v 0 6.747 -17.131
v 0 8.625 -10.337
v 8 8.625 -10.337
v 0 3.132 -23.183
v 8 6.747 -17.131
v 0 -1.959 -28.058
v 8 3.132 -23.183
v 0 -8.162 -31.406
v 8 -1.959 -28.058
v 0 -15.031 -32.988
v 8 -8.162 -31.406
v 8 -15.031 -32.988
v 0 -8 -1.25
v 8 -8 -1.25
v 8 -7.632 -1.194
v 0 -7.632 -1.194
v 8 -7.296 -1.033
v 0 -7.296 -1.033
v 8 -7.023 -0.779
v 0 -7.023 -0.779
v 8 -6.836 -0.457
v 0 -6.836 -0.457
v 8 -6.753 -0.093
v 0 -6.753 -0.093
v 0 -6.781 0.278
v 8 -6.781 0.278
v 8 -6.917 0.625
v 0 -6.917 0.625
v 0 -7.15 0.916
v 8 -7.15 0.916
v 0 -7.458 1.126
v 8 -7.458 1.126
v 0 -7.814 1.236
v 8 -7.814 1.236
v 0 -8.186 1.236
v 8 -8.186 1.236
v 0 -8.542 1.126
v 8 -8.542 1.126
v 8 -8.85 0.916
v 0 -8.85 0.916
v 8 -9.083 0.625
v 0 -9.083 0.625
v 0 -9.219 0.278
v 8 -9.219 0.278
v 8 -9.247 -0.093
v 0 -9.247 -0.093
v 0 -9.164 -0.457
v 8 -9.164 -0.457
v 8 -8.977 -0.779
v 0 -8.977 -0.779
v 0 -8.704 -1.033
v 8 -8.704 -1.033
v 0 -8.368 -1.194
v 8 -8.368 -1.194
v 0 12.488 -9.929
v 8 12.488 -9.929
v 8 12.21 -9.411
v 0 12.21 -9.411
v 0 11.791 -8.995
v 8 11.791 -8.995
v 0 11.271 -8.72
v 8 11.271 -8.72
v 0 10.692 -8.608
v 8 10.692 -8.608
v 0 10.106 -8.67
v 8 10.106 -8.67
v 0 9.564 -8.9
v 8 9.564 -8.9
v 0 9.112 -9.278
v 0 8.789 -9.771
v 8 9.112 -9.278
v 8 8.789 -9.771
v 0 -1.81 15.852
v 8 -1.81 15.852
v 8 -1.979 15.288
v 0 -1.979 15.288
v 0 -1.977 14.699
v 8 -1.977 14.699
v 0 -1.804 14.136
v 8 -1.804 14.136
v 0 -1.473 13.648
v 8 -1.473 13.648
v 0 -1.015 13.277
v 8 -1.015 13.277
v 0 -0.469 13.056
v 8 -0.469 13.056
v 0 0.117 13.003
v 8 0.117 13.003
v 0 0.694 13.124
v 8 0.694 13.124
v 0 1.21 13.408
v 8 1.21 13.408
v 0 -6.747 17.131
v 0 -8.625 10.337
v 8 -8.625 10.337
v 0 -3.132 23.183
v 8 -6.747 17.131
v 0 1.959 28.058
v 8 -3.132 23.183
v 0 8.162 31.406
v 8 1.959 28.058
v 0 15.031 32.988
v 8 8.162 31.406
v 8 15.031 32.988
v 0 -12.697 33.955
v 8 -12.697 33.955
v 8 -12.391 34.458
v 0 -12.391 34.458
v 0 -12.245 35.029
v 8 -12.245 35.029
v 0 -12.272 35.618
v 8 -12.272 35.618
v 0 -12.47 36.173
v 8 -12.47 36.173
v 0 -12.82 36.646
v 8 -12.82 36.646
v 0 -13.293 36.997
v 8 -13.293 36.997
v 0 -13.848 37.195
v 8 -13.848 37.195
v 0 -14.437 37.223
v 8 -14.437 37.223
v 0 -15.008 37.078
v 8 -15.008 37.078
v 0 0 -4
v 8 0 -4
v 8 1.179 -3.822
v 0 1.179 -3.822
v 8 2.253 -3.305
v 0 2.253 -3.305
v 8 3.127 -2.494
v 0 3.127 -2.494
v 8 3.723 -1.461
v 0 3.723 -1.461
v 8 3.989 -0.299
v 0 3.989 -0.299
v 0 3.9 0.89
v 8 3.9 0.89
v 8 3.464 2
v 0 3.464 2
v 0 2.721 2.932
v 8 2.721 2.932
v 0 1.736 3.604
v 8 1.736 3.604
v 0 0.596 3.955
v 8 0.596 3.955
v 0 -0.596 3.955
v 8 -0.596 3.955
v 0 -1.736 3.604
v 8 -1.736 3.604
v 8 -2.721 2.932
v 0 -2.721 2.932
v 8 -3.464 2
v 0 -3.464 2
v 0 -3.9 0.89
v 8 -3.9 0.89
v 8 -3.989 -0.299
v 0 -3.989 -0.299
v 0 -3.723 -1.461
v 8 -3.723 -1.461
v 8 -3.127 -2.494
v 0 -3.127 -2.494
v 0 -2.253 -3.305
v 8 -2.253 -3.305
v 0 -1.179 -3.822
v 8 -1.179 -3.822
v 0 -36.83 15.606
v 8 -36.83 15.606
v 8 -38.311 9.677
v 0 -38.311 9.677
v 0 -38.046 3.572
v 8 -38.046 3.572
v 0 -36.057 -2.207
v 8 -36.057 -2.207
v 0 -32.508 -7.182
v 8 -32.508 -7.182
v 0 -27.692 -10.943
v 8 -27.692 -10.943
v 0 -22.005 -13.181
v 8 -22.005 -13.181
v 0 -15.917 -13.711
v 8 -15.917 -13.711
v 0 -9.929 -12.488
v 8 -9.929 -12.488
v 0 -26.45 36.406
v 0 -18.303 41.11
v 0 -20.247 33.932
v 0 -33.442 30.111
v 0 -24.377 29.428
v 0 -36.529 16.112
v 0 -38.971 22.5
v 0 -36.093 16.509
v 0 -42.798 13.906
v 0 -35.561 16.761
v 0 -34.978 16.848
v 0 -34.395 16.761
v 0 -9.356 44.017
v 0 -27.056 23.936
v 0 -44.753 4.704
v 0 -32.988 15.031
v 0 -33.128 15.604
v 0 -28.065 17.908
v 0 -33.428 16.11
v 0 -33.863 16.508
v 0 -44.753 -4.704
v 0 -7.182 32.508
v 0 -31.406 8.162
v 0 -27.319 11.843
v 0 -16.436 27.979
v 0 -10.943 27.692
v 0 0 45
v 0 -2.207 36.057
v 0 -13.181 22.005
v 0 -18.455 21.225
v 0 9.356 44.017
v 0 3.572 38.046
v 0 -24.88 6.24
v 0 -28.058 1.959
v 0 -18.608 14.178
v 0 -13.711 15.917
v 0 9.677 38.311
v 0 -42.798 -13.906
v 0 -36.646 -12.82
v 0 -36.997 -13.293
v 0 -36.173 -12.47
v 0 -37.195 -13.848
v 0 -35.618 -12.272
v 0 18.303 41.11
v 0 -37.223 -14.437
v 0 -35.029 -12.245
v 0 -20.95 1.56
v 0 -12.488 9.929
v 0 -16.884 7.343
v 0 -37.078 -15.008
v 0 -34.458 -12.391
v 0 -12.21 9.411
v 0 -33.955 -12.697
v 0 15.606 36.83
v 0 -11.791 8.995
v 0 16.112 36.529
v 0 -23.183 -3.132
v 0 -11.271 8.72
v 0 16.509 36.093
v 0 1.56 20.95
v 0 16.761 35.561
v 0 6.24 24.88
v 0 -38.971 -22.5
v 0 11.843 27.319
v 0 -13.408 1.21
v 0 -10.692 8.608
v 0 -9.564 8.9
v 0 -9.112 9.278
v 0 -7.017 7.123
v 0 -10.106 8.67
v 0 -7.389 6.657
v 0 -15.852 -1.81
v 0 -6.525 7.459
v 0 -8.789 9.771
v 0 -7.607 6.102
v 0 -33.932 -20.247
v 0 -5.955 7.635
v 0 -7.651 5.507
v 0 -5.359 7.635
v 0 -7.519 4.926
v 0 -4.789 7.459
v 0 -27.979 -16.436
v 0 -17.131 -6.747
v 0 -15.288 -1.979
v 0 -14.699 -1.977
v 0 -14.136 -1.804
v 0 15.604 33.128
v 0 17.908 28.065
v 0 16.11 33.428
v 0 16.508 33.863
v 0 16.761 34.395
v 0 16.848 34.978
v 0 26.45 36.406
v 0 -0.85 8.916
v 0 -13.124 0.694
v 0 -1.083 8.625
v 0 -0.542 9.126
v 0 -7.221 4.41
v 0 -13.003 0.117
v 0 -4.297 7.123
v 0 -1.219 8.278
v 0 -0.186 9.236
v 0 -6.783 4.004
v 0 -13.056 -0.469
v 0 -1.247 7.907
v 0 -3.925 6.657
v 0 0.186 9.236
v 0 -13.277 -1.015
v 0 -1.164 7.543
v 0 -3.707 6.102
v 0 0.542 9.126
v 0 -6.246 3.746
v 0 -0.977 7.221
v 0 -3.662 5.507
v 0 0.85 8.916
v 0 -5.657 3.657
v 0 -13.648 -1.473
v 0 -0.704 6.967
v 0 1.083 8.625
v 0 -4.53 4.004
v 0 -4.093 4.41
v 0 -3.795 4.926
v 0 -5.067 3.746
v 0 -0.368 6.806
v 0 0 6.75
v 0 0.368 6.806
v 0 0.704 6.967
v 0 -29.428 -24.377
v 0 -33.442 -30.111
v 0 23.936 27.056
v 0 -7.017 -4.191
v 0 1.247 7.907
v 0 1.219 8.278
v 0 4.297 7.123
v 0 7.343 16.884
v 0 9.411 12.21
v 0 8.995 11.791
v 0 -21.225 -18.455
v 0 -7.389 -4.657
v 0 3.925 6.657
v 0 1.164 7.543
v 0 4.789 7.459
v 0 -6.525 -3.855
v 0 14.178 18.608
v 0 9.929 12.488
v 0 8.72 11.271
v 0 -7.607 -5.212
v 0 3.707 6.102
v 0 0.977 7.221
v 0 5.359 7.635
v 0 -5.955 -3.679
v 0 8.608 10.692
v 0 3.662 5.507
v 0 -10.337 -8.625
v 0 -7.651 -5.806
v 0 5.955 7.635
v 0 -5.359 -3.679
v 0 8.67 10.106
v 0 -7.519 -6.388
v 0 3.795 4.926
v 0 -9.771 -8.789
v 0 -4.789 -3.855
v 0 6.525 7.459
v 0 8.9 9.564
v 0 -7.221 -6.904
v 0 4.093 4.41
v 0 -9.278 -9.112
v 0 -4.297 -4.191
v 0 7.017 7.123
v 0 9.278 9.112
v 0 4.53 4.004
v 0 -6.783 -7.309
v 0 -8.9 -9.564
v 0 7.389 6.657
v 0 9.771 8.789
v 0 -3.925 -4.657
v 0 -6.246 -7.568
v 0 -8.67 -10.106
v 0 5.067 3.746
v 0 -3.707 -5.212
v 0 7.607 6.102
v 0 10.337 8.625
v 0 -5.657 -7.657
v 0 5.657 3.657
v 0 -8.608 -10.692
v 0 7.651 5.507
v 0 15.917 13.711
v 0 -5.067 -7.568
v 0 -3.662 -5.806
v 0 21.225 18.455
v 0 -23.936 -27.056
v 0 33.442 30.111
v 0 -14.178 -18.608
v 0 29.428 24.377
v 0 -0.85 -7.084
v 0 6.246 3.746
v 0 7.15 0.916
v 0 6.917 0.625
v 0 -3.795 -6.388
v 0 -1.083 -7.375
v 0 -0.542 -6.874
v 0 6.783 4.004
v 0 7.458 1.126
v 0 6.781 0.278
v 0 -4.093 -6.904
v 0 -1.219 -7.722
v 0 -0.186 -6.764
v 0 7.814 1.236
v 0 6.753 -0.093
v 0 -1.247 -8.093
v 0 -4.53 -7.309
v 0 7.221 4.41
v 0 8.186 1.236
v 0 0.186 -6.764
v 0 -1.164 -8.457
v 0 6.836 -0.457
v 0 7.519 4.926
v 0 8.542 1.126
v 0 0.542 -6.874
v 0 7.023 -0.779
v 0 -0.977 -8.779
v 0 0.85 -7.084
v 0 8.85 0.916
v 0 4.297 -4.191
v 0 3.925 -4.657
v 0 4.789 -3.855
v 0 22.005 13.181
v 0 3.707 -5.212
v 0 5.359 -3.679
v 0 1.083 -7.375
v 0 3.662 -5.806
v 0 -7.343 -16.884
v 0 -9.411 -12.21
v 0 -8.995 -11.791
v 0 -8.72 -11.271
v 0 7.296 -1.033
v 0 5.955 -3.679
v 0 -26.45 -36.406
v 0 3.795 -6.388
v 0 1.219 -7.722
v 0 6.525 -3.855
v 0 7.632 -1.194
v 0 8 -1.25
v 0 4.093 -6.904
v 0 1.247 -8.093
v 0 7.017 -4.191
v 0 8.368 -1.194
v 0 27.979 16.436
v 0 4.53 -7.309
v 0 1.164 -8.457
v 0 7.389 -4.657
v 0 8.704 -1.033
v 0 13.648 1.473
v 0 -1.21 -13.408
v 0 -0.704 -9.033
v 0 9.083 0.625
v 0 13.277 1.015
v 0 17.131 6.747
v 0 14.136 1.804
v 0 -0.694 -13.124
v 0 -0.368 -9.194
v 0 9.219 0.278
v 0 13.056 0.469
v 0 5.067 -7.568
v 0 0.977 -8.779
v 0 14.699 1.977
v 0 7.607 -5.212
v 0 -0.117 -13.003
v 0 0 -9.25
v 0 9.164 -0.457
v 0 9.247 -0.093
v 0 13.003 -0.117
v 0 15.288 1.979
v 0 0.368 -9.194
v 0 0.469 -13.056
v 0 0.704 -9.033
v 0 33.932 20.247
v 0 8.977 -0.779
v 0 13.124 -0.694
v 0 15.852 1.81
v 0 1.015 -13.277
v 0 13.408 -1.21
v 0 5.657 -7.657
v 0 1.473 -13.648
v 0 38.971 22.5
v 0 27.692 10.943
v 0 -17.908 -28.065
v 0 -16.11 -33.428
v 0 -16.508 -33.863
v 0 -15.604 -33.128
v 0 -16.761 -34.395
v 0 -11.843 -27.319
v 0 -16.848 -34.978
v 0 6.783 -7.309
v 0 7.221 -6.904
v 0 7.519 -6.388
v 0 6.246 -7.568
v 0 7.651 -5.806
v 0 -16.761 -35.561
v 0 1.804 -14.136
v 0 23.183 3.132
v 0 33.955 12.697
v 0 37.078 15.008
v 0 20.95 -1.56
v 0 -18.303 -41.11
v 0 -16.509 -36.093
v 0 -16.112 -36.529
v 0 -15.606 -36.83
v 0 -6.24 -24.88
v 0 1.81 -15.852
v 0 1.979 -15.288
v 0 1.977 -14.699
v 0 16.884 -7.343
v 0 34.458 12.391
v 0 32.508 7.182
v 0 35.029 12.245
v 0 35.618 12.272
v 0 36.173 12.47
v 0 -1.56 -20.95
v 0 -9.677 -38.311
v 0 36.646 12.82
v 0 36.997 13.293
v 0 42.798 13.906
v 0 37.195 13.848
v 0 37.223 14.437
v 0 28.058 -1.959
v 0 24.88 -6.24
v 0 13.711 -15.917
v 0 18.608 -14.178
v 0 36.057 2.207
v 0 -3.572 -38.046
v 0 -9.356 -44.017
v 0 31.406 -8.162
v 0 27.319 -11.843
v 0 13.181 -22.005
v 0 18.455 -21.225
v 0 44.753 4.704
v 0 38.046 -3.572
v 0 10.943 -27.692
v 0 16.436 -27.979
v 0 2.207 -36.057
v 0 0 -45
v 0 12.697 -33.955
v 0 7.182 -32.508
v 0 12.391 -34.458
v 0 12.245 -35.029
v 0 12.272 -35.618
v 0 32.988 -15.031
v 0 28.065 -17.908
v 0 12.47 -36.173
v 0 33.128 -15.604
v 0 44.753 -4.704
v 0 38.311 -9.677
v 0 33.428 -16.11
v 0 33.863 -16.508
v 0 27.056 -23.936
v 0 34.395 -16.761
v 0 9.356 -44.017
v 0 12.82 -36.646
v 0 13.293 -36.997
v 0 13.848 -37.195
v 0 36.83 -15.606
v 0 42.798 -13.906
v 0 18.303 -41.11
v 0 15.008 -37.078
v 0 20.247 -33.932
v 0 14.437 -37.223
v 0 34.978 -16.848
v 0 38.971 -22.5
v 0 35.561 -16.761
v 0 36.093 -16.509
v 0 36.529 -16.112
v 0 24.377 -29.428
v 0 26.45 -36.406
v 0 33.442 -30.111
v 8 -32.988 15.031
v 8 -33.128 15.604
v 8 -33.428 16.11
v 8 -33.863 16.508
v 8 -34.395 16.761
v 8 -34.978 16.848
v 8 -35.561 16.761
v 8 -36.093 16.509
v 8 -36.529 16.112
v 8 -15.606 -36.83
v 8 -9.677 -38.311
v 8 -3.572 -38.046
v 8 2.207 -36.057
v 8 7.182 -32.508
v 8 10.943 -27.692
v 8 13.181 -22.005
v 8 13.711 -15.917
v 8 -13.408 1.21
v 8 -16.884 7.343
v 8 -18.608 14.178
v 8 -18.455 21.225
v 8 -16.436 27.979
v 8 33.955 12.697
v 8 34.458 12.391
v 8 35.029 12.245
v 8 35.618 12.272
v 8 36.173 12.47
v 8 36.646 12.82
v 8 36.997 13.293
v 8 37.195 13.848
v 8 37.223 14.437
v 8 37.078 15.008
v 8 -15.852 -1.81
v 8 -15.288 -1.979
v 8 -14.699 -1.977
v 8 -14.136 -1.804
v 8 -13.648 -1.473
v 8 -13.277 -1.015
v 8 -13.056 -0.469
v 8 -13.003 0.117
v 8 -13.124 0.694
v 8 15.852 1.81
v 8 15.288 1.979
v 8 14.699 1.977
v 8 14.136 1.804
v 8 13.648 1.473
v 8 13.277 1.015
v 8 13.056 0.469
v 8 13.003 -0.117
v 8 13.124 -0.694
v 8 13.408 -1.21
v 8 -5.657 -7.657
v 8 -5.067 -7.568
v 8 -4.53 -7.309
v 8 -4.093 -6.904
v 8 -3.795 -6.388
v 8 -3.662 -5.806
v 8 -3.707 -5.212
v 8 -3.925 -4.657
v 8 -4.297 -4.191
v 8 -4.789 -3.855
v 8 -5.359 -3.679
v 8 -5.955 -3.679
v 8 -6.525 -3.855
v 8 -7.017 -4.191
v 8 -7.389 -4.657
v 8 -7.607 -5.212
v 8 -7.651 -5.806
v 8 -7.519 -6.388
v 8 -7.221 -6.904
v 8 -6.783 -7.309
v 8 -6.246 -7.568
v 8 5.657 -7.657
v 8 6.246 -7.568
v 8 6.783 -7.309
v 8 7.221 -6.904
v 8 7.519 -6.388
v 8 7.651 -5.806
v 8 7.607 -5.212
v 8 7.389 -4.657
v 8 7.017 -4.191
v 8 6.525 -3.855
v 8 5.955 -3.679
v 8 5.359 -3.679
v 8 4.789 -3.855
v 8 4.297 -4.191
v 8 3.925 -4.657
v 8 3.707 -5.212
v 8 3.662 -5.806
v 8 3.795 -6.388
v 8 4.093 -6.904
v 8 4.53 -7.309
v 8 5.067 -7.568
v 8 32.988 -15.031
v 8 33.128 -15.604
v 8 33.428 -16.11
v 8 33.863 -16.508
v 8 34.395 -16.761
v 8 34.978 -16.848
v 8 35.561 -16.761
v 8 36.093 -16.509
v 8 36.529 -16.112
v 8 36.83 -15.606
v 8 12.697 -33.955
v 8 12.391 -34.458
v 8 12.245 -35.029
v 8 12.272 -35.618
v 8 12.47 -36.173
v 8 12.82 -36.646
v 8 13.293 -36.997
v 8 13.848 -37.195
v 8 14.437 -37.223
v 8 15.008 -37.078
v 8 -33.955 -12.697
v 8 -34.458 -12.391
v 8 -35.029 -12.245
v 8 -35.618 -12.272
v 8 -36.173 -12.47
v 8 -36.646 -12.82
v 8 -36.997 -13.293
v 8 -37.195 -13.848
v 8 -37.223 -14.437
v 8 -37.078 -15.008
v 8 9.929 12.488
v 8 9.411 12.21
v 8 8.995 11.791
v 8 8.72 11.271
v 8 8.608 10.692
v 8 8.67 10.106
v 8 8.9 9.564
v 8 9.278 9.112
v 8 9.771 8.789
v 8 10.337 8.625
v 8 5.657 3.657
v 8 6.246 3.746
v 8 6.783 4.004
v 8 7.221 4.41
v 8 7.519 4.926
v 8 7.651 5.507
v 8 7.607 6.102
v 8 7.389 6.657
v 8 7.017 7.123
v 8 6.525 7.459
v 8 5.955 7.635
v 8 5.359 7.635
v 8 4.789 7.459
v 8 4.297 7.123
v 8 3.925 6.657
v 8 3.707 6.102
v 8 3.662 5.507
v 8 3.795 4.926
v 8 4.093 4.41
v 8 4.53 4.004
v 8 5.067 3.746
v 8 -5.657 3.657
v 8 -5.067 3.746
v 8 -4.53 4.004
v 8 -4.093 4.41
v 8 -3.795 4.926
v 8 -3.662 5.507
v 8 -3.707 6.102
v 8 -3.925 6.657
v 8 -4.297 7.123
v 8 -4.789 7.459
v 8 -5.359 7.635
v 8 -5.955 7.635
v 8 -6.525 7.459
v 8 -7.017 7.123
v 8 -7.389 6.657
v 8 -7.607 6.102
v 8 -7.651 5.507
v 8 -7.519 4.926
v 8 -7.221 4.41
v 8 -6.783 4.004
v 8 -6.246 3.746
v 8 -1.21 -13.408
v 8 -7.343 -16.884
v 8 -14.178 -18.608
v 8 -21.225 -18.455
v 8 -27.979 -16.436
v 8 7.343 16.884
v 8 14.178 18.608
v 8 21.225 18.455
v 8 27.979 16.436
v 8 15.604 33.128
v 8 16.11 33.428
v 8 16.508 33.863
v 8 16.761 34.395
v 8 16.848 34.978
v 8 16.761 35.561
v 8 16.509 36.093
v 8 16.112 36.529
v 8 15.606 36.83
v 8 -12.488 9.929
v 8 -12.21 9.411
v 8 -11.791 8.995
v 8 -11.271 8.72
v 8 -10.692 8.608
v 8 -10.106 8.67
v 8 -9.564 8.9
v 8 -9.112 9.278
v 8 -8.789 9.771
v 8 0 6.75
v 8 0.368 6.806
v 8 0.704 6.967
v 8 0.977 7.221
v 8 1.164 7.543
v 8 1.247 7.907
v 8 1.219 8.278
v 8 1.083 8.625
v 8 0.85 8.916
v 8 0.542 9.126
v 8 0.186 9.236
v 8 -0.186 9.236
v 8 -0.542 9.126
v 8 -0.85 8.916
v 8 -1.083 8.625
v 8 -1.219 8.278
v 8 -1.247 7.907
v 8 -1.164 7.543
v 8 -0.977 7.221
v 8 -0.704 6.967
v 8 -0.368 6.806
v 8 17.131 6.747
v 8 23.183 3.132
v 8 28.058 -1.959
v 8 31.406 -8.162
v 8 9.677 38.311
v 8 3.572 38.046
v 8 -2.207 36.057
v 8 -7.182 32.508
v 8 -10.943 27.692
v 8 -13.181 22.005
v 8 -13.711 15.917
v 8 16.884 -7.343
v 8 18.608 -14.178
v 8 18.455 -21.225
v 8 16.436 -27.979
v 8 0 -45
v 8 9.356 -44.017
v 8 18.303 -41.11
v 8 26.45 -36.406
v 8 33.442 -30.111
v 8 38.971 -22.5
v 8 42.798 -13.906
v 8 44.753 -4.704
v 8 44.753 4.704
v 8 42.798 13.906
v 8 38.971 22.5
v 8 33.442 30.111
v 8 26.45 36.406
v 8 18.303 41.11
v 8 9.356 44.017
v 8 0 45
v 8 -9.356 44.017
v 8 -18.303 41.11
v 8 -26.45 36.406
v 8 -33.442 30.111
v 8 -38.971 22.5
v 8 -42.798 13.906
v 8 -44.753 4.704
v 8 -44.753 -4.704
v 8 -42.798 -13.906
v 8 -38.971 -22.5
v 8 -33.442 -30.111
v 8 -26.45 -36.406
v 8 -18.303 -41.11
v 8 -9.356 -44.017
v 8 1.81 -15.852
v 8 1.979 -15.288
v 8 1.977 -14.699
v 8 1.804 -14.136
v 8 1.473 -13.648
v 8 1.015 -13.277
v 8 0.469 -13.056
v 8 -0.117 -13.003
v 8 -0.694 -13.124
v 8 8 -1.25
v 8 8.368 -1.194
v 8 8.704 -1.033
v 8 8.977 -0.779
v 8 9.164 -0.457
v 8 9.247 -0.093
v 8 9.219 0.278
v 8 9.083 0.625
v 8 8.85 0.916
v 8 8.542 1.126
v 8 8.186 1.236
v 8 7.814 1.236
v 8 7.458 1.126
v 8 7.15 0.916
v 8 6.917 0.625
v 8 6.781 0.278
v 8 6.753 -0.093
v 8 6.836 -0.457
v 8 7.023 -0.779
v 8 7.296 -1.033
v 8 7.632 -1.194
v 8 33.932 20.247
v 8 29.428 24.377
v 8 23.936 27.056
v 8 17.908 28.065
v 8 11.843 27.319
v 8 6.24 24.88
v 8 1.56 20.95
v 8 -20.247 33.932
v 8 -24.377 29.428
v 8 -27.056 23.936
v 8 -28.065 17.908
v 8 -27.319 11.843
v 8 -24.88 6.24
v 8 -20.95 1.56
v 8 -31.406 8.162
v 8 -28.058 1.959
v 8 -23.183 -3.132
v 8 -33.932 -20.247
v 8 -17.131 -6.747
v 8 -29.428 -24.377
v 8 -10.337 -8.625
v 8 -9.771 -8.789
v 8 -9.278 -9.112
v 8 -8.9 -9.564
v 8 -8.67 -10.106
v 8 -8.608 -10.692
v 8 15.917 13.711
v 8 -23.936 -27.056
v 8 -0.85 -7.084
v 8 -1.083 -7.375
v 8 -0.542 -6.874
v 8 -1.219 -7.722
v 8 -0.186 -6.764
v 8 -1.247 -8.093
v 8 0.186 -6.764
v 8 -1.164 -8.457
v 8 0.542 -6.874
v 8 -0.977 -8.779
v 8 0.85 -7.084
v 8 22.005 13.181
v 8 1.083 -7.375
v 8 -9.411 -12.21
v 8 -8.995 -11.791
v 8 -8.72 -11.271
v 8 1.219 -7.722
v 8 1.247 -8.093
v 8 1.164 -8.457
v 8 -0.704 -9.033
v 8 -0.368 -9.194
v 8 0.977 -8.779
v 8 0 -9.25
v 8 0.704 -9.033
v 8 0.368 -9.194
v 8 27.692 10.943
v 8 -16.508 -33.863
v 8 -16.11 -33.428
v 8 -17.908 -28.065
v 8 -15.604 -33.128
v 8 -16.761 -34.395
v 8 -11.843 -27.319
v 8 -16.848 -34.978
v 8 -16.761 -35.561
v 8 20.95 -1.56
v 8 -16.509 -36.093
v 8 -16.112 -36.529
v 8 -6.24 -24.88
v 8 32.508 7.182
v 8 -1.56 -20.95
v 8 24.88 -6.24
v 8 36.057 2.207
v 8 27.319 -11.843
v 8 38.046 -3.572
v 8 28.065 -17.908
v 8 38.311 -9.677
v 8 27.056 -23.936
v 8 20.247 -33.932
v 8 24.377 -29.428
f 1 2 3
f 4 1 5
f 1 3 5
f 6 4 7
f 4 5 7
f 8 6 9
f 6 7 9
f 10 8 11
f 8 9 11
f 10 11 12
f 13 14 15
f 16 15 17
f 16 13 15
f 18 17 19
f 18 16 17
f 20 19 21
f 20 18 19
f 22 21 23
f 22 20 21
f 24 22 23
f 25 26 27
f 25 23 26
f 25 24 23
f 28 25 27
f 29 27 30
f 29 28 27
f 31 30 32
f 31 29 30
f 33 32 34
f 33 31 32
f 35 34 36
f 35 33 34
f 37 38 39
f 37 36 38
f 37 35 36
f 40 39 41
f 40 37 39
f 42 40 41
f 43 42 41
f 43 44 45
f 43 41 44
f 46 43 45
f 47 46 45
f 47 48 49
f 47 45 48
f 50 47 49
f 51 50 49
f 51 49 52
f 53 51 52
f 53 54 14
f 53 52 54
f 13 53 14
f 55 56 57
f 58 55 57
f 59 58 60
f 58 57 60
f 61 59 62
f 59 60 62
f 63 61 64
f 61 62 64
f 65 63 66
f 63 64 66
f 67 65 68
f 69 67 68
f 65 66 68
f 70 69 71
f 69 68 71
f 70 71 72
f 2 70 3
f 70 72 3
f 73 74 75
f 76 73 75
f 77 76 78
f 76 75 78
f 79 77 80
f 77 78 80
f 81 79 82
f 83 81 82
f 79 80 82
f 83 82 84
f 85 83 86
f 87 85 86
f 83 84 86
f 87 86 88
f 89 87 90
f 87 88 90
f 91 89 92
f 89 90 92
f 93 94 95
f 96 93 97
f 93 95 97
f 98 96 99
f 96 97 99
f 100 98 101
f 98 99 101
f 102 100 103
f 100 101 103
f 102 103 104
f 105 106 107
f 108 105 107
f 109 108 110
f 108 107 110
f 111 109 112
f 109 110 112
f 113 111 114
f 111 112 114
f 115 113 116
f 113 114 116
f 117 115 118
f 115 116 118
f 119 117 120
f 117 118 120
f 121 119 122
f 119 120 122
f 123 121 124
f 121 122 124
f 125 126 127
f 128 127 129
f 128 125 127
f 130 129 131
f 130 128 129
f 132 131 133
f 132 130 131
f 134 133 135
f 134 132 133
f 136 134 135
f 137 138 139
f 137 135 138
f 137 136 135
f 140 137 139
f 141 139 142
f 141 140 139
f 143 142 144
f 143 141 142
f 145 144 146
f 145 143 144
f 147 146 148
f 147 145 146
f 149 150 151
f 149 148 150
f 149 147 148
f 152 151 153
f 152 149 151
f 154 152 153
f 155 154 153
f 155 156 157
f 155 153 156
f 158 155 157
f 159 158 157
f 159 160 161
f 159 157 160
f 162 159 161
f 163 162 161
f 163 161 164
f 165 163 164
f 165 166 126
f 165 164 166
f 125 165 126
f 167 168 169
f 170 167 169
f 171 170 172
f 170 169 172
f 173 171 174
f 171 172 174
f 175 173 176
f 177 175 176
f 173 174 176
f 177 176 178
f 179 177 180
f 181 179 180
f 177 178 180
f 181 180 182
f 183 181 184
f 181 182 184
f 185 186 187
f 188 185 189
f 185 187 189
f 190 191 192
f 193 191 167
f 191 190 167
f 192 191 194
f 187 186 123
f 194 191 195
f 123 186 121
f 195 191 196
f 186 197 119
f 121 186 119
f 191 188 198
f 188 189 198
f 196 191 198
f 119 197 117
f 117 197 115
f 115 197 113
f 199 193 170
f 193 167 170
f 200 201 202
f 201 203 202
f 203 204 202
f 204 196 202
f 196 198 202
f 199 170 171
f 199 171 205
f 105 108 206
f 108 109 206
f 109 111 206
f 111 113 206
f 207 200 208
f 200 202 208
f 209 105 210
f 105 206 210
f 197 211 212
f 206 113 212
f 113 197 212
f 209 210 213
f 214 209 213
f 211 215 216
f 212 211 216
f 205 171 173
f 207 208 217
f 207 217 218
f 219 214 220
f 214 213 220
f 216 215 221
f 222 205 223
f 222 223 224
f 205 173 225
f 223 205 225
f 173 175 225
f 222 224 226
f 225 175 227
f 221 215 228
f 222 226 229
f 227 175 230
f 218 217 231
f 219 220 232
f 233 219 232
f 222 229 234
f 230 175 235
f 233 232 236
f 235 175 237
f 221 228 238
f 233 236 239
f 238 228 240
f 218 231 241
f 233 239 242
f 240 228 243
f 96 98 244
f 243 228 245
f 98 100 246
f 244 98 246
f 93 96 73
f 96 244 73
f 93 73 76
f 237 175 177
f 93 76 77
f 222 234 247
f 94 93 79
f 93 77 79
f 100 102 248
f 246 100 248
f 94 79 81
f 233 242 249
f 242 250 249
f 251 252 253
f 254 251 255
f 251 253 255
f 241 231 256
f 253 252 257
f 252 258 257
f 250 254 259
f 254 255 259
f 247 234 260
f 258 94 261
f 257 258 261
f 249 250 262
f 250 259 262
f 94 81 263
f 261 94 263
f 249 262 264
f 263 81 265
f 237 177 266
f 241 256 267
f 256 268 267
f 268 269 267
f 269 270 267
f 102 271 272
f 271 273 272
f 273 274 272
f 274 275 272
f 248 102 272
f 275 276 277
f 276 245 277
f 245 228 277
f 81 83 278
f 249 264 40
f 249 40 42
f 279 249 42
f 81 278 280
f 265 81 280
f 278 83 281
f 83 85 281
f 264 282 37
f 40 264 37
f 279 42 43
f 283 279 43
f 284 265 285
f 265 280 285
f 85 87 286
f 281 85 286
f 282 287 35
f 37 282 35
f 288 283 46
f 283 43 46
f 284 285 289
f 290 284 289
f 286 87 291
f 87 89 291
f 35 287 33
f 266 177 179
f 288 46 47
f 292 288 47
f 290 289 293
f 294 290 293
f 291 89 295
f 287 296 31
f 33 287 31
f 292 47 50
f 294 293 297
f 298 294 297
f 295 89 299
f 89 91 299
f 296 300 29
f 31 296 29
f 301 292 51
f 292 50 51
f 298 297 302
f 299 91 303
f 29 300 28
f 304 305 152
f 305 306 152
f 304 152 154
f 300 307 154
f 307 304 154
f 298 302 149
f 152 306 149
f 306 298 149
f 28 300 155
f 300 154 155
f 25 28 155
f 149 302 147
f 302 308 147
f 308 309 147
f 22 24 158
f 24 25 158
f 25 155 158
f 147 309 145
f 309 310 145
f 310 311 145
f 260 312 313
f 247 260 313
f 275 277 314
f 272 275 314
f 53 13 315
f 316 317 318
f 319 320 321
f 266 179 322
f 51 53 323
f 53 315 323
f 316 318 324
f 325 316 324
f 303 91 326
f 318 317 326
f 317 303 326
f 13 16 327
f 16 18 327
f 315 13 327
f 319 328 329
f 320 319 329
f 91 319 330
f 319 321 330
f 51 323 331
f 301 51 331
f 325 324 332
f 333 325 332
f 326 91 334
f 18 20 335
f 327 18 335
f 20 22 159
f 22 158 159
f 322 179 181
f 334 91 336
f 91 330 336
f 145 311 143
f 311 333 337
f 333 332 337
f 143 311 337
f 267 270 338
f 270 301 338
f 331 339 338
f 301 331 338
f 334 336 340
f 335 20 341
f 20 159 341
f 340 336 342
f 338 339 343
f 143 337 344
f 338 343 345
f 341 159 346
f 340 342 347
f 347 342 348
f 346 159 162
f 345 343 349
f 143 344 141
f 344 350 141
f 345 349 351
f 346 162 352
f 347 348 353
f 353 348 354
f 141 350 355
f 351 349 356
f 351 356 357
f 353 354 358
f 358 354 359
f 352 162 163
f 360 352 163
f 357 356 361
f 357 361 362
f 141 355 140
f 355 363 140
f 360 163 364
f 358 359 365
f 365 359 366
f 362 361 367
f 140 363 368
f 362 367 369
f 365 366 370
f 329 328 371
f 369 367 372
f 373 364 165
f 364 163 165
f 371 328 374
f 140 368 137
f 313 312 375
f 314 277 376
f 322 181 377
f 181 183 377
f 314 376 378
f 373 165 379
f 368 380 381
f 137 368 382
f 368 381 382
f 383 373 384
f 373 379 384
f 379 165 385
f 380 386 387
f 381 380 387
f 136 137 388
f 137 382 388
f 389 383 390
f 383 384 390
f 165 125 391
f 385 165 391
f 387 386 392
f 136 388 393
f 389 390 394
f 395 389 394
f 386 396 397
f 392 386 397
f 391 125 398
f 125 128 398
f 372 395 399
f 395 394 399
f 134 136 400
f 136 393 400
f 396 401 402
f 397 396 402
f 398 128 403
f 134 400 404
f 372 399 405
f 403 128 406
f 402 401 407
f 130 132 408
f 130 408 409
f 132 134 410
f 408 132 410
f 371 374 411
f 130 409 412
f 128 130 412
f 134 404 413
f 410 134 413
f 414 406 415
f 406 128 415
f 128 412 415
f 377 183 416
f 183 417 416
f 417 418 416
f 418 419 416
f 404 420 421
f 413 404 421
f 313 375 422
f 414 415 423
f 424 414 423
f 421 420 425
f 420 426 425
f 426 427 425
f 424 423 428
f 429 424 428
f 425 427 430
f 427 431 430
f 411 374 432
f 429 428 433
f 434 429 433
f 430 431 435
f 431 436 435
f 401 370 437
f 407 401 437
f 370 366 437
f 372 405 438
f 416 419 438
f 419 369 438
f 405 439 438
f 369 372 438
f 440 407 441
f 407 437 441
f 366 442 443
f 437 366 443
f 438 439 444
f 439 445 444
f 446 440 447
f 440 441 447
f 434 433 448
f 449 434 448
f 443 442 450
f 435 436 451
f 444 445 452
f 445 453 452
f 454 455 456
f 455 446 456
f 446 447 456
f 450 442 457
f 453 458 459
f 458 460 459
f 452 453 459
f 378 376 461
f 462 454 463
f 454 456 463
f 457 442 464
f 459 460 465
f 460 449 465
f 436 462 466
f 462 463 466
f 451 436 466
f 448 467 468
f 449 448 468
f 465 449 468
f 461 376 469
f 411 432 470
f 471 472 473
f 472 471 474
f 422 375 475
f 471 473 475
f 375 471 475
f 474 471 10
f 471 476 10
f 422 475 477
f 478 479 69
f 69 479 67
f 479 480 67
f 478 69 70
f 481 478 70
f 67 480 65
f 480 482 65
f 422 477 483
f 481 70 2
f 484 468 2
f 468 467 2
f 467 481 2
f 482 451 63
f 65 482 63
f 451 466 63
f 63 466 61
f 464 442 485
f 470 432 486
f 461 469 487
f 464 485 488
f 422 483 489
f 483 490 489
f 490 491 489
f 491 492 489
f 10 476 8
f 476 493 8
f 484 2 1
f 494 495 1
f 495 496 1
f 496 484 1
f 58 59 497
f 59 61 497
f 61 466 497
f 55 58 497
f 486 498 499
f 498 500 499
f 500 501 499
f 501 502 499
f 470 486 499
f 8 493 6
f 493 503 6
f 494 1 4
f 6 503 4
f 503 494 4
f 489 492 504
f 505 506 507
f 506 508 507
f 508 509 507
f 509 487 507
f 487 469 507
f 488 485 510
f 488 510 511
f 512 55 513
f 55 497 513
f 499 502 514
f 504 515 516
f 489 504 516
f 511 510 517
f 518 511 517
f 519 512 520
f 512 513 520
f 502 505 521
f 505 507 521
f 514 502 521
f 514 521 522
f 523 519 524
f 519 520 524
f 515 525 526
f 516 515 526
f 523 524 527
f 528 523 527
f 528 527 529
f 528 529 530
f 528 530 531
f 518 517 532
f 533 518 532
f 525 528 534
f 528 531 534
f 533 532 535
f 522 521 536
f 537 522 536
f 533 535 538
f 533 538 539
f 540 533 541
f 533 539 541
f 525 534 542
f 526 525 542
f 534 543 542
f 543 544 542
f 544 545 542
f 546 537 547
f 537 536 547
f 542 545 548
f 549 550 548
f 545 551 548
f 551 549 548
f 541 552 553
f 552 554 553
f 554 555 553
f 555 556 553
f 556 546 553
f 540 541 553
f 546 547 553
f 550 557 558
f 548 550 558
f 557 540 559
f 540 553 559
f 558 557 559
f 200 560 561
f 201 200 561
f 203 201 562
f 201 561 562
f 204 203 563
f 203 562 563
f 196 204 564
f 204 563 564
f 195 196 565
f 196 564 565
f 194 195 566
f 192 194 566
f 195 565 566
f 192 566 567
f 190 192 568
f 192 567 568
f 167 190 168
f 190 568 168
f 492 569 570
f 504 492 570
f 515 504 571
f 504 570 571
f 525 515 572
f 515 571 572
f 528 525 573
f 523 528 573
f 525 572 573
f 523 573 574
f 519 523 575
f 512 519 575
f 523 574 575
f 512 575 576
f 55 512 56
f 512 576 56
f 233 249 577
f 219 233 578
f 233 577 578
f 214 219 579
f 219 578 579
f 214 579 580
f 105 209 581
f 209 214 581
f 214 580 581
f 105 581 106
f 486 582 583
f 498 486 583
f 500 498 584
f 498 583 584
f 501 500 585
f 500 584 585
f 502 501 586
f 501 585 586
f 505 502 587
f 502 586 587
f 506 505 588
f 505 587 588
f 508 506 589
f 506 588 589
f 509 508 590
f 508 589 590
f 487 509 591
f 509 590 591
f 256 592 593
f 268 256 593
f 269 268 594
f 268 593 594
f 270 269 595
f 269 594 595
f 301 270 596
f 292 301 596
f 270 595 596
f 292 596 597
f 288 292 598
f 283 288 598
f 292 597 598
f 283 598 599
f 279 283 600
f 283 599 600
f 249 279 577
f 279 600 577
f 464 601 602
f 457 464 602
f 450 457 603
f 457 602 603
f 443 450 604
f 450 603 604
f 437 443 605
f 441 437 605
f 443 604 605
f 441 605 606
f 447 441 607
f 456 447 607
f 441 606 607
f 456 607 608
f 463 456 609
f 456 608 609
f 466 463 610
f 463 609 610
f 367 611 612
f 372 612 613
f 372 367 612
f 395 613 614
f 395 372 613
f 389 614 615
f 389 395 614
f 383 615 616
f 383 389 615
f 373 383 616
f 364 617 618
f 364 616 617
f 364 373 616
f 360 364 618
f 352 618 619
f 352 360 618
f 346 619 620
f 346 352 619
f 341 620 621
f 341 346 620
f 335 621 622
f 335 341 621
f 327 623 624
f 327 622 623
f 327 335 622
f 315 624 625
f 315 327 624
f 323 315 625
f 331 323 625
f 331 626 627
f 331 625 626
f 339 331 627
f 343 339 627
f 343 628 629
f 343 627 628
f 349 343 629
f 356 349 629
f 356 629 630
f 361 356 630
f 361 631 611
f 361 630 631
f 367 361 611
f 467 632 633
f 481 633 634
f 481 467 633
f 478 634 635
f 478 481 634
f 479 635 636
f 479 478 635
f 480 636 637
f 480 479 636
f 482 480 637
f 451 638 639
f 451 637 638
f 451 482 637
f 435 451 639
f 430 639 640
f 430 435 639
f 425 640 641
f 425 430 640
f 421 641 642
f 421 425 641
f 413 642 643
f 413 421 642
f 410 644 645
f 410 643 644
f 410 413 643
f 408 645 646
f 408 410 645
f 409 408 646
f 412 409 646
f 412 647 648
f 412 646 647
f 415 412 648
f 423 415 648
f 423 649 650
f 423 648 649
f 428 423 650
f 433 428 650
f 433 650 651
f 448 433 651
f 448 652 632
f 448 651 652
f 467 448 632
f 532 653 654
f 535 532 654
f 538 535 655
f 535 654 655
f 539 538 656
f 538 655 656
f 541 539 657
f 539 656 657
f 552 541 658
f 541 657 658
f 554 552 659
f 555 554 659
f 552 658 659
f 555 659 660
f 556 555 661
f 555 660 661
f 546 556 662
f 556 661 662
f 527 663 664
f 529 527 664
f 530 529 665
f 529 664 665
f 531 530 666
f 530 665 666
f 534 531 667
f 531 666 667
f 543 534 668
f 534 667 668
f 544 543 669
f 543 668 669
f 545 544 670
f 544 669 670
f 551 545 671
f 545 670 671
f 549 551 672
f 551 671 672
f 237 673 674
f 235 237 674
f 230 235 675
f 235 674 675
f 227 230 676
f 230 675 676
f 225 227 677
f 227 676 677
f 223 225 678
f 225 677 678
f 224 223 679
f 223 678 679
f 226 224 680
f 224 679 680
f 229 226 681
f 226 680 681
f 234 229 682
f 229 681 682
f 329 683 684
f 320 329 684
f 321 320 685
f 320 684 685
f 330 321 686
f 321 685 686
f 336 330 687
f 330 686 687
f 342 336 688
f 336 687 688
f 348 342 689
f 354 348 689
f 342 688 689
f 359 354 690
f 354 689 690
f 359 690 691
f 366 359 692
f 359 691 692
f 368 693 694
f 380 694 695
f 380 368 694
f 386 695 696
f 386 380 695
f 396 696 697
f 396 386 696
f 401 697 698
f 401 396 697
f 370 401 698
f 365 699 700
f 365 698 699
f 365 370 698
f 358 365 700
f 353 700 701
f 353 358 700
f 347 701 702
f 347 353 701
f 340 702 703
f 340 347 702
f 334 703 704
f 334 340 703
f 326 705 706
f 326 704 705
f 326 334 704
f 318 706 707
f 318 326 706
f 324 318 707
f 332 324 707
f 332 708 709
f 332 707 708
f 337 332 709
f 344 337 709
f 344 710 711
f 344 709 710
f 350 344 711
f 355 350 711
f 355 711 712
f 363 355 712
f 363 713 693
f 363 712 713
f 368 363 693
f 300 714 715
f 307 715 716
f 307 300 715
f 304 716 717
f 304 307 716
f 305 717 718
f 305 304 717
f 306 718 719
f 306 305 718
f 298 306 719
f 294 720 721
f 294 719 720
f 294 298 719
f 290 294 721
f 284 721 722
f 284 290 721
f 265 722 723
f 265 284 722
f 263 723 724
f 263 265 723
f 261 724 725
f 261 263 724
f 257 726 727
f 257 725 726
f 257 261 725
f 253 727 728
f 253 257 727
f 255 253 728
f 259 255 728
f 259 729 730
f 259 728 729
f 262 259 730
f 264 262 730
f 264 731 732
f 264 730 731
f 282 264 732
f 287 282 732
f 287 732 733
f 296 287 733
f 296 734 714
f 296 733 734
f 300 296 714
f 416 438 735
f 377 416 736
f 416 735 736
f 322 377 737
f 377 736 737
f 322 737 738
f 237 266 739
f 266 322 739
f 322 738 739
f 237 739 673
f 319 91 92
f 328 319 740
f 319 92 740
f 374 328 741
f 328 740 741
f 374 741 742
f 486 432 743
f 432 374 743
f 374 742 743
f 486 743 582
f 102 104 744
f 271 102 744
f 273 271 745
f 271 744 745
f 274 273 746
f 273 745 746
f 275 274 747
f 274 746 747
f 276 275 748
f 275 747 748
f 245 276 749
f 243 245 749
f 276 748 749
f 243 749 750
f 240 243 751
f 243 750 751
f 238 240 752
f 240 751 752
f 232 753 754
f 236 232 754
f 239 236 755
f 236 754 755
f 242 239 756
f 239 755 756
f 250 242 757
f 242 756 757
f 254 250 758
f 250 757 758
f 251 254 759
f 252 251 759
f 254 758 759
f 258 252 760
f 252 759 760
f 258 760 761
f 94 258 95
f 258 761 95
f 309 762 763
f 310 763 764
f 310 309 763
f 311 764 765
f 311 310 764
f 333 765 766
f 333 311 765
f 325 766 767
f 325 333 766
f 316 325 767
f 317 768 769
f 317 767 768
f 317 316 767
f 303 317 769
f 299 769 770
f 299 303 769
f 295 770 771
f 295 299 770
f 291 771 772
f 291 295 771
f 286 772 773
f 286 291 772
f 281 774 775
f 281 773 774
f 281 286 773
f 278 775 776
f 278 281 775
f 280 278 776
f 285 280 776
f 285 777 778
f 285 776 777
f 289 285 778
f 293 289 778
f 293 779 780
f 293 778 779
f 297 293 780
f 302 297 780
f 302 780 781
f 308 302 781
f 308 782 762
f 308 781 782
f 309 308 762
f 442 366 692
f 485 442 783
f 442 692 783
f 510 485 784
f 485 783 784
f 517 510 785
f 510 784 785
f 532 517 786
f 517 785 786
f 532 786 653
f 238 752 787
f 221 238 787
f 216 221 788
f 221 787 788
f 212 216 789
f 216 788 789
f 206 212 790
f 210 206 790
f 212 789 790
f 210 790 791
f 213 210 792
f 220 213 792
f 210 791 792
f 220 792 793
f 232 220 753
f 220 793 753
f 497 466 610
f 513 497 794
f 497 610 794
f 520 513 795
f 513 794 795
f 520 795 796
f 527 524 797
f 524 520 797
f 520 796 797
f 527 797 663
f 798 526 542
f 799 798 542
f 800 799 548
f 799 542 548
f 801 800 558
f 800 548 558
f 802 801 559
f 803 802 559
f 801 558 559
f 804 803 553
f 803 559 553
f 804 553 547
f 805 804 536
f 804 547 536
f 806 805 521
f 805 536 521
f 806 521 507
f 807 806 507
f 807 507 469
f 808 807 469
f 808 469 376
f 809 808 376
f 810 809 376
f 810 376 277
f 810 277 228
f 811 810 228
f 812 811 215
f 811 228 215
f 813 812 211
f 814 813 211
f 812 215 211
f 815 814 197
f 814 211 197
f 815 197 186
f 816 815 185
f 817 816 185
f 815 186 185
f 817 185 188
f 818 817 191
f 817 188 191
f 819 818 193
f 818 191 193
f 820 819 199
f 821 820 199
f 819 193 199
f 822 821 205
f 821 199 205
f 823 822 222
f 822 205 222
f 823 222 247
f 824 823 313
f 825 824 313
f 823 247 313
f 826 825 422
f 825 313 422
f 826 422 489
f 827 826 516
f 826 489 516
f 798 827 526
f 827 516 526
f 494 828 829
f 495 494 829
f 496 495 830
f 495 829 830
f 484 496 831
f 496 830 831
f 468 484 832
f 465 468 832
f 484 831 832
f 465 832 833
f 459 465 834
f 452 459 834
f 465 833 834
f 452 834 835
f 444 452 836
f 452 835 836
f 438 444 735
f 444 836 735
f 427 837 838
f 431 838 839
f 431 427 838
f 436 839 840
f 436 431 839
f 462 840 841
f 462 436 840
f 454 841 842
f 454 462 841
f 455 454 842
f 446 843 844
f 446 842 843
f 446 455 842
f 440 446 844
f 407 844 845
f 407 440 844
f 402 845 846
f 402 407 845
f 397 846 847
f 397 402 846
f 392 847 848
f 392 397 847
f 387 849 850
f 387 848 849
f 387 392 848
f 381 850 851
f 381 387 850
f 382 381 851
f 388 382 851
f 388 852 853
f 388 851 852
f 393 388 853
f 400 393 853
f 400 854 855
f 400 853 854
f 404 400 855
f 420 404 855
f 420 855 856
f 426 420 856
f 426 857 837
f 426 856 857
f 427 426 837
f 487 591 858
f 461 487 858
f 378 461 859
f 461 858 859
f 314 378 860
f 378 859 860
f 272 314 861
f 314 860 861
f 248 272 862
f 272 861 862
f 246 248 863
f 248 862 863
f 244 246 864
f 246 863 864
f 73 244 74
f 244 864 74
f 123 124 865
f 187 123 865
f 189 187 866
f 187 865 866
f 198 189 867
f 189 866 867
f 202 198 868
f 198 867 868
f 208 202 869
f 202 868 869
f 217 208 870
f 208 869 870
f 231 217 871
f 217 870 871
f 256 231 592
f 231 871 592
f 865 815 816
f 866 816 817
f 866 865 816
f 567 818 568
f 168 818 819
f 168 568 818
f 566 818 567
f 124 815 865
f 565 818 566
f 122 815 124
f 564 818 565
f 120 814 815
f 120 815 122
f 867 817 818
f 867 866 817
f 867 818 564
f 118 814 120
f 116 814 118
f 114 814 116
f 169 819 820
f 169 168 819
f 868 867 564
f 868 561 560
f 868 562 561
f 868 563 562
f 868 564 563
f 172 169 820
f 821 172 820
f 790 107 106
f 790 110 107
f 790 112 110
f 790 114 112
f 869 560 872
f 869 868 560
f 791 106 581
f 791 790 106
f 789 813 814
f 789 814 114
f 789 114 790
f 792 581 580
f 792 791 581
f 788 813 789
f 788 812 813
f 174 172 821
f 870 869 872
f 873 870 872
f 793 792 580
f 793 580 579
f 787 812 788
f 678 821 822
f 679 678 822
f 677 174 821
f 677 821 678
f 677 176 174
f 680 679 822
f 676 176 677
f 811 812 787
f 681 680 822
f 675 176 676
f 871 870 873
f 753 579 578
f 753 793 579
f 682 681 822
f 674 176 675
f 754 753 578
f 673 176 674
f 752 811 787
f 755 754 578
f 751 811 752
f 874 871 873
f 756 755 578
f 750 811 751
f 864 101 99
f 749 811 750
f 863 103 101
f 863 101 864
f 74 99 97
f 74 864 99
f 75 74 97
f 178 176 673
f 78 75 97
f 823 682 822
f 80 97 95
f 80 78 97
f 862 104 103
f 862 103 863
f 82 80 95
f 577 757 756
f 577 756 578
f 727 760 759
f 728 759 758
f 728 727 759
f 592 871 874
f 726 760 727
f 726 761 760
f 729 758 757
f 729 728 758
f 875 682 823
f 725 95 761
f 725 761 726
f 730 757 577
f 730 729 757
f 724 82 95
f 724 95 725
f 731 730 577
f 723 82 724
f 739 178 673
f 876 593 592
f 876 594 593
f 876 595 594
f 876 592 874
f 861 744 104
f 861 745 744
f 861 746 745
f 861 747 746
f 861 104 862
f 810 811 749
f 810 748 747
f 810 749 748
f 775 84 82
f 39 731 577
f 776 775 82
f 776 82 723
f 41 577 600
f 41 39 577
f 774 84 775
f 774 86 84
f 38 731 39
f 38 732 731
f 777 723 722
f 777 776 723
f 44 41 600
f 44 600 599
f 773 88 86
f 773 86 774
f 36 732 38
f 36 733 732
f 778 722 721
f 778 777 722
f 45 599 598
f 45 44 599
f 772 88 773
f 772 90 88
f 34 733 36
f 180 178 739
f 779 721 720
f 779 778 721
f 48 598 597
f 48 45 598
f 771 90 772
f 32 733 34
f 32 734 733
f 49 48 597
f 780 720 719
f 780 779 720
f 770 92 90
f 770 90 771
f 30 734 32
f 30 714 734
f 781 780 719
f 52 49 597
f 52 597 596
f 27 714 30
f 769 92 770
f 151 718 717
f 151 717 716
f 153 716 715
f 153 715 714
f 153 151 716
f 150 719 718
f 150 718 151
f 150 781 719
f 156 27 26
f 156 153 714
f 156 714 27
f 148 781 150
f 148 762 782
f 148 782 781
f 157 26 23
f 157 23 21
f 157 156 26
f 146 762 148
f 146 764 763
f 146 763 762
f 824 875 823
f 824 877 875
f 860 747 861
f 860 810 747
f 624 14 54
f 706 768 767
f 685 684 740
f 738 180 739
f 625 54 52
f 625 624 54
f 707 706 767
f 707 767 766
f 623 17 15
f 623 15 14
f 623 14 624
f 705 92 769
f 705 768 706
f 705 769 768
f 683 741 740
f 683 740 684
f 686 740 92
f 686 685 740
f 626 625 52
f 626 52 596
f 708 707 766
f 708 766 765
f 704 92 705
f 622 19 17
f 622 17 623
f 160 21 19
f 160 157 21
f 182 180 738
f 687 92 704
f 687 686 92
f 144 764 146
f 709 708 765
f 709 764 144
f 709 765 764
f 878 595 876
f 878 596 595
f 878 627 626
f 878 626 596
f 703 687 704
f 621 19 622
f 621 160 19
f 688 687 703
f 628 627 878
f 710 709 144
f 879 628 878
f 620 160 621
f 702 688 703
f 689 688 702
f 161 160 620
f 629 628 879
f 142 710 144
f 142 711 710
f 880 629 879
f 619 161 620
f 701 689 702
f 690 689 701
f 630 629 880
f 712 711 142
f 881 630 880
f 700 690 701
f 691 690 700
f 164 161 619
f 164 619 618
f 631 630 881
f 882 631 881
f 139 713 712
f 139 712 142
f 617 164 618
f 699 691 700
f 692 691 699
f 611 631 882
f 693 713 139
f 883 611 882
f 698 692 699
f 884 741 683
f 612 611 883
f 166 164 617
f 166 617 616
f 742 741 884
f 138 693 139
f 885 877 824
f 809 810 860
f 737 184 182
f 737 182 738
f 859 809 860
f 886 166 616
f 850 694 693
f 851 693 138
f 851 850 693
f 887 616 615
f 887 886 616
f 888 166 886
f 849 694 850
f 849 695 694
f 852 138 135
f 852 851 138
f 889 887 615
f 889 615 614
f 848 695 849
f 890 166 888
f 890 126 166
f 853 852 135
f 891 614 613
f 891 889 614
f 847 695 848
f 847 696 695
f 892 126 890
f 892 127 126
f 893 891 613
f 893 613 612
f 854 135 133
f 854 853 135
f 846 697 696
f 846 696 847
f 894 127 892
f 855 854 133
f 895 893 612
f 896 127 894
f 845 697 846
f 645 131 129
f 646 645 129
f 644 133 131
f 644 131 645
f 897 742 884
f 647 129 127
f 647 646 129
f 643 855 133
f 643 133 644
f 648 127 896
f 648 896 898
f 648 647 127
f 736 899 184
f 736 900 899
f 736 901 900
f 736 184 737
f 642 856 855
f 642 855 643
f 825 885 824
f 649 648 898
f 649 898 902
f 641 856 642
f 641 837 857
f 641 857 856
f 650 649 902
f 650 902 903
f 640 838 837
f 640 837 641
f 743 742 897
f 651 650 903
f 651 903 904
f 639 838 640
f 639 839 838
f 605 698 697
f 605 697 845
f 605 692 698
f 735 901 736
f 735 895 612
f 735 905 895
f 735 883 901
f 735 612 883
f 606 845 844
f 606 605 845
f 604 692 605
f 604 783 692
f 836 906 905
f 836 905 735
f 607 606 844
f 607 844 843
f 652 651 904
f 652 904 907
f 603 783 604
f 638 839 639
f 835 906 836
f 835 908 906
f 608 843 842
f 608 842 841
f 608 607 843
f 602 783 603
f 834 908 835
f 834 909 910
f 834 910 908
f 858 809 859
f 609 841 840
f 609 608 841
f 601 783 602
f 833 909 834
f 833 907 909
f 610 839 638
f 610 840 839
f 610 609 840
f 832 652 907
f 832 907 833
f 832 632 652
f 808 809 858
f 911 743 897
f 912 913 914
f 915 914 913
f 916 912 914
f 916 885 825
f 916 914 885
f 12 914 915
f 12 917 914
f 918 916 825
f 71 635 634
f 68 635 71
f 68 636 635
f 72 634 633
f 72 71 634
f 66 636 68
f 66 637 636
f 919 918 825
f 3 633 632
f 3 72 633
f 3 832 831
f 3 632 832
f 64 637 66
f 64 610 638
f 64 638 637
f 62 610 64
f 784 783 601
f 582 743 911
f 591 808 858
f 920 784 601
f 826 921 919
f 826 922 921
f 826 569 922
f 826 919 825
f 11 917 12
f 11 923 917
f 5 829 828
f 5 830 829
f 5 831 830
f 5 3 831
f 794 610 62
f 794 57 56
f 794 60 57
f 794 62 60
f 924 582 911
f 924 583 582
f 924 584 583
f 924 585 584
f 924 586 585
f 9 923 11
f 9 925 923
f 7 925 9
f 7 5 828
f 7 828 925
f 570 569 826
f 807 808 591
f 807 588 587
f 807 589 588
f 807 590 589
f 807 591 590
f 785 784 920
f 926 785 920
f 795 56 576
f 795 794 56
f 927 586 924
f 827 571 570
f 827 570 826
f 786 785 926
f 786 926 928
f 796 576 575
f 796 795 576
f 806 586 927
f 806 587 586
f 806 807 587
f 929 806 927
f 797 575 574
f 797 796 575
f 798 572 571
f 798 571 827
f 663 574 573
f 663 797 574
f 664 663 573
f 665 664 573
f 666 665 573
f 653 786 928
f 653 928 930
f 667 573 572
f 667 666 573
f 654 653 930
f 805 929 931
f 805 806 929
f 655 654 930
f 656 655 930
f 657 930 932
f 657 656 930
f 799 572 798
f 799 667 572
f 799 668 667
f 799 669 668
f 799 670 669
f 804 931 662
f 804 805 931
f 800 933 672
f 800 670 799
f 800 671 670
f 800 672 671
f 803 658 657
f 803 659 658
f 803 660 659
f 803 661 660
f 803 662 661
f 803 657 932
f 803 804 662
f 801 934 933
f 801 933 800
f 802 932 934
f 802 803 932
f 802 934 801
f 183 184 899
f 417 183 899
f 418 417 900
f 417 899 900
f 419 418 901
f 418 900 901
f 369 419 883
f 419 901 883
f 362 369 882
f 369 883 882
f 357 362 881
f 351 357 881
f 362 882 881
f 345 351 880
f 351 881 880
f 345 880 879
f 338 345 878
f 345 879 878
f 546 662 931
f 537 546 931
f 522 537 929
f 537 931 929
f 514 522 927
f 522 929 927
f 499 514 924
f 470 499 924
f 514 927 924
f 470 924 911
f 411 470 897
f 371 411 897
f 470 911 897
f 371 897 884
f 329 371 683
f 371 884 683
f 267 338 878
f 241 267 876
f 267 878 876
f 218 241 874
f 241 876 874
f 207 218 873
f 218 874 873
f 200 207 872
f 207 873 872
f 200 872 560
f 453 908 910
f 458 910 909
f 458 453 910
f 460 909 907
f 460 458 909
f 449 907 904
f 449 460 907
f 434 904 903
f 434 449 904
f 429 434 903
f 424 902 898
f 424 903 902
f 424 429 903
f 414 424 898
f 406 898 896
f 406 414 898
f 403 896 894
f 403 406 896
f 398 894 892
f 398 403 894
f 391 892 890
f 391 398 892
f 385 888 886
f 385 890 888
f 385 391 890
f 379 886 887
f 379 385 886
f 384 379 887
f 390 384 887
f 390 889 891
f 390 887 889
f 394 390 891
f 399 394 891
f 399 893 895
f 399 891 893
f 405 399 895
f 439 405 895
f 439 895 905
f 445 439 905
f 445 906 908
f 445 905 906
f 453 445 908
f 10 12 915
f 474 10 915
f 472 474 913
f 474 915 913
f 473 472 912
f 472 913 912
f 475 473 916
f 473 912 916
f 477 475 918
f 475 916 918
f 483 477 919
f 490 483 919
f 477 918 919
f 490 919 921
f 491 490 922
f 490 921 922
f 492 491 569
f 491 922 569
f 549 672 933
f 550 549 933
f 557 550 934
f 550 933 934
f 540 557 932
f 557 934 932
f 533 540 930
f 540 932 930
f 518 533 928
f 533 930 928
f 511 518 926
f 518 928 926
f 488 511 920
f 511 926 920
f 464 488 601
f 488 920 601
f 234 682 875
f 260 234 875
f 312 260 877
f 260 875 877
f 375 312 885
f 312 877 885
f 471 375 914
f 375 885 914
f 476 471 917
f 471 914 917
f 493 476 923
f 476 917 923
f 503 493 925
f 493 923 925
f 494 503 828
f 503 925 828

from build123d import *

# Parameters (mm, degrees)
SPROCKET_R                   = 45
ESTRUSIONE_ESTRUSIONE2_DEPTH = 8
SCHIZZO1_R                   = 4
SCHIZZO1_R_2                 = 2
SCHIZZO1_R_3                 = 1.25
TAGLIO_ESTRUSIONE2_DEPTH     = 9
TAGLIO_ESTRUSIONE3_DEPTH     = 9


with BuildPart() as part:
    # Sprocket → Estrusione-Estrusione2 (new body)
    with BuildSketch(Plane(origin=(0, 0, 0), x_dir=(0, 0, -1), z_dir=(1, 0, 0))):
        Circle(SPROCKET_R)
    extrude(amount=ESTRUSIONE_ESTRUSIONE2_DEPTH)

    # Schizzo1 → Taglio-Estrusione2 (cut, through all)
    with BuildSketch(Plane(origin=(0, 0, 0), x_dir=(0, 0, -1), z_dir=(1, 0, 0))):
        Circle(SCHIZZO1_R)
        with Locations((-5.656854249, 5.656854249)):
            Circle(SCHIZZO1_R_2)
        with Locations((5.656854249, 5.656854249)):
            Circle(SCHIZZO1_R_2)
        with Locations((0, 8)):
            Circle(SCHIZZO1_R_3)
        with Locations((8, 0)):
            Circle(SCHIZZO1_R_3)
        with Locations((-8, 0)):
            Circle(SCHIZZO1_R_3)
        with Locations((0, -8)):
            Circle(SCHIZZO1_R_3)
        with Locations((5.656854249, -5.656854249)):
            Circle(SCHIZZO1_R_2)
        with Locations((-5.656854249, -5.656854249)):
            Circle(SCHIZZO1_R_2)
    extrude(amount=TAGLIO_ESTRUSIONE2_DEPTH, mode=Mode.SUBTRACT)

    # Schizzo2 → Taglio-Estrusione3 (cut, through all)
    with BuildSketch(Plane(origin=(8, 0, 0), x_dir=(0, 0, -1), z_dir=(1, 0, 0))):
        with BuildLine():
            ThreePointArc((10.336761524, 8.624888754), (25.791574711, 0.750648199), (32.987627274, -15.031358723))
            ThreePointArc((32.987627274, -15.031358723), (34.683367414, -16.825784979), (36.829895727, -15.605983186))
            ThreePointArc((36.829895727, -15.605983186), (32.508005906, 7.181633564), (9.929440233, 12.488476401))
            ThreePointArc((9.929440233, 12.488476401), (8.617624488, 10.396912474), (10.336761524, 8.624888754))
        make_face()
        with BuildLine():
            ThreePointArc((-1.809511828, 15.851860872), (-1.2581466, 13.445308027), (1.210476844, 13.407911494))
            ThreePointArc((1.210476844, 13.407911494), (17.706608944, 18.768185808), (33.954550624, 12.696999257))
            ThreePointArc((33.954550624, 12.696999257), (36.42247095, 12.627217636), (37.077765557, 15.007572481))
            ThreePointArc((37.077765557, 15.007572481), (17.908449626, 28.064813212), (-1.809511828, 15.851860872))
        make_face()
        with BuildLine():
            ThreePointArc((13.407911494, -1.210476844), (18.768185808, -17.706608944), (12.696999257, -33.954550624))
            ThreePointArc((12.696999257, -33.954550624), (12.627217636, -36.42247095), (15.007572481, -37.077765557))
            ThreePointArc((15.007572481, -37.077765557), (28.064813212, -17.908449626), (15.851860872, 1.809511828))
            ThreePointArc((15.851860872, 1.809511828), (13.445308027, 1.2581466), (13.407911494, -1.210476844))
        make_face()
        with BuildLine():
            ThreePointArc((8.624888754, -10.336761524), (0.750648199, -25.791574711), (-15.031358723, -32.987627274))
            ThreePointArc((-15.031358723, -32.987627274), (-16.825784979, -34.683367414), (-15.605983186, -36.829895727))
            ThreePointArc((-15.605983186, -36.829895727), (7.181633564, -32.508005906), (12.488476401, -9.929440233))
            ThreePointArc((12.488476401, -9.929440233), (10.396912474, -8.617624488), (8.624888754, -10.336761524))
        make_face()
        with BuildLine():
            ThreePointArc((-1.210476844, -13.407911494), (-17.706608944, -18.768185808), (-33.954550624, -12.696999257))
            ThreePointArc((-33.954550624, -12.696999257), (-36.42247095, -12.627217636), (-37.077765557, -15.007572481))
            ThreePointArc((-37.077765557, -15.007572481), (-17.908449626, -28.064813212), (1.809511828, -15.851860872))
            ThreePointArc((1.809511828, -15.851860872), (1.2581466, -13.445308027), (-1.210476844, -13.407911494))
        make_face()
        with BuildLine():
            ThreePointArc((-10.336761524, -8.624888754), (-25.791574711, -0.750648199), (-32.987627274, 15.031358723))
            ThreePointArc((-32.987627274, 15.031358723), (-34.683367414, 16.825784979), (-36.829895727, 15.605983186))
            ThreePointArc((-36.829895727, 15.605983186), (-32.508005906, -7.181633564), (-9.929440233, -12.488476401))
            ThreePointArc((-9.929440233, -12.488476401), (-8.617624488, -10.396912474), (-10.336761524, -8.624888754))
        make_face()
        with BuildLine():
            ThreePointArc((-13.407911494, 1.210476844), (-18.768185808, 17.706608944), (-12.696999257, 33.954550624))
            ThreePointArc((-12.696999257, 33.954550624), (-12.627217636, 36.42247095), (-15.007572481, 37.077765557))
            ThreePointArc((-15.007572481, 37.077765557), (-28.064813212, 17.908449626), (-15.851860872, -1.809511828))
            ThreePointArc((-15.851860872, -1.809511828), (-13.445308027, -1.2581466), (-13.407911494, 1.210476844))
        make_face()
        with BuildLine():
            ThreePointArc((-8.624888754, 10.336761524), (-0.750648199, 25.791574711), (15.031358723, 32.987627274))
            ThreePointArc((15.031358723, 32.987627274), (16.825784979, 34.683367414), (15.605983186, 36.829895727))
            ThreePointArc((15.605983186, 36.829895727), (-7.181633564, 32.508005906), (-12.488476401, 9.929440233))
            ThreePointArc((-12.488476401, 9.929440233), (-10.396912474, 8.617624488), (-8.624888754, 10.336761524))
        make_face()
    extrude(amount=-TAGLIO_ESTRUSIONE3_DEPTH, mode=Mode.SUBTRACT)


solid = part.part
